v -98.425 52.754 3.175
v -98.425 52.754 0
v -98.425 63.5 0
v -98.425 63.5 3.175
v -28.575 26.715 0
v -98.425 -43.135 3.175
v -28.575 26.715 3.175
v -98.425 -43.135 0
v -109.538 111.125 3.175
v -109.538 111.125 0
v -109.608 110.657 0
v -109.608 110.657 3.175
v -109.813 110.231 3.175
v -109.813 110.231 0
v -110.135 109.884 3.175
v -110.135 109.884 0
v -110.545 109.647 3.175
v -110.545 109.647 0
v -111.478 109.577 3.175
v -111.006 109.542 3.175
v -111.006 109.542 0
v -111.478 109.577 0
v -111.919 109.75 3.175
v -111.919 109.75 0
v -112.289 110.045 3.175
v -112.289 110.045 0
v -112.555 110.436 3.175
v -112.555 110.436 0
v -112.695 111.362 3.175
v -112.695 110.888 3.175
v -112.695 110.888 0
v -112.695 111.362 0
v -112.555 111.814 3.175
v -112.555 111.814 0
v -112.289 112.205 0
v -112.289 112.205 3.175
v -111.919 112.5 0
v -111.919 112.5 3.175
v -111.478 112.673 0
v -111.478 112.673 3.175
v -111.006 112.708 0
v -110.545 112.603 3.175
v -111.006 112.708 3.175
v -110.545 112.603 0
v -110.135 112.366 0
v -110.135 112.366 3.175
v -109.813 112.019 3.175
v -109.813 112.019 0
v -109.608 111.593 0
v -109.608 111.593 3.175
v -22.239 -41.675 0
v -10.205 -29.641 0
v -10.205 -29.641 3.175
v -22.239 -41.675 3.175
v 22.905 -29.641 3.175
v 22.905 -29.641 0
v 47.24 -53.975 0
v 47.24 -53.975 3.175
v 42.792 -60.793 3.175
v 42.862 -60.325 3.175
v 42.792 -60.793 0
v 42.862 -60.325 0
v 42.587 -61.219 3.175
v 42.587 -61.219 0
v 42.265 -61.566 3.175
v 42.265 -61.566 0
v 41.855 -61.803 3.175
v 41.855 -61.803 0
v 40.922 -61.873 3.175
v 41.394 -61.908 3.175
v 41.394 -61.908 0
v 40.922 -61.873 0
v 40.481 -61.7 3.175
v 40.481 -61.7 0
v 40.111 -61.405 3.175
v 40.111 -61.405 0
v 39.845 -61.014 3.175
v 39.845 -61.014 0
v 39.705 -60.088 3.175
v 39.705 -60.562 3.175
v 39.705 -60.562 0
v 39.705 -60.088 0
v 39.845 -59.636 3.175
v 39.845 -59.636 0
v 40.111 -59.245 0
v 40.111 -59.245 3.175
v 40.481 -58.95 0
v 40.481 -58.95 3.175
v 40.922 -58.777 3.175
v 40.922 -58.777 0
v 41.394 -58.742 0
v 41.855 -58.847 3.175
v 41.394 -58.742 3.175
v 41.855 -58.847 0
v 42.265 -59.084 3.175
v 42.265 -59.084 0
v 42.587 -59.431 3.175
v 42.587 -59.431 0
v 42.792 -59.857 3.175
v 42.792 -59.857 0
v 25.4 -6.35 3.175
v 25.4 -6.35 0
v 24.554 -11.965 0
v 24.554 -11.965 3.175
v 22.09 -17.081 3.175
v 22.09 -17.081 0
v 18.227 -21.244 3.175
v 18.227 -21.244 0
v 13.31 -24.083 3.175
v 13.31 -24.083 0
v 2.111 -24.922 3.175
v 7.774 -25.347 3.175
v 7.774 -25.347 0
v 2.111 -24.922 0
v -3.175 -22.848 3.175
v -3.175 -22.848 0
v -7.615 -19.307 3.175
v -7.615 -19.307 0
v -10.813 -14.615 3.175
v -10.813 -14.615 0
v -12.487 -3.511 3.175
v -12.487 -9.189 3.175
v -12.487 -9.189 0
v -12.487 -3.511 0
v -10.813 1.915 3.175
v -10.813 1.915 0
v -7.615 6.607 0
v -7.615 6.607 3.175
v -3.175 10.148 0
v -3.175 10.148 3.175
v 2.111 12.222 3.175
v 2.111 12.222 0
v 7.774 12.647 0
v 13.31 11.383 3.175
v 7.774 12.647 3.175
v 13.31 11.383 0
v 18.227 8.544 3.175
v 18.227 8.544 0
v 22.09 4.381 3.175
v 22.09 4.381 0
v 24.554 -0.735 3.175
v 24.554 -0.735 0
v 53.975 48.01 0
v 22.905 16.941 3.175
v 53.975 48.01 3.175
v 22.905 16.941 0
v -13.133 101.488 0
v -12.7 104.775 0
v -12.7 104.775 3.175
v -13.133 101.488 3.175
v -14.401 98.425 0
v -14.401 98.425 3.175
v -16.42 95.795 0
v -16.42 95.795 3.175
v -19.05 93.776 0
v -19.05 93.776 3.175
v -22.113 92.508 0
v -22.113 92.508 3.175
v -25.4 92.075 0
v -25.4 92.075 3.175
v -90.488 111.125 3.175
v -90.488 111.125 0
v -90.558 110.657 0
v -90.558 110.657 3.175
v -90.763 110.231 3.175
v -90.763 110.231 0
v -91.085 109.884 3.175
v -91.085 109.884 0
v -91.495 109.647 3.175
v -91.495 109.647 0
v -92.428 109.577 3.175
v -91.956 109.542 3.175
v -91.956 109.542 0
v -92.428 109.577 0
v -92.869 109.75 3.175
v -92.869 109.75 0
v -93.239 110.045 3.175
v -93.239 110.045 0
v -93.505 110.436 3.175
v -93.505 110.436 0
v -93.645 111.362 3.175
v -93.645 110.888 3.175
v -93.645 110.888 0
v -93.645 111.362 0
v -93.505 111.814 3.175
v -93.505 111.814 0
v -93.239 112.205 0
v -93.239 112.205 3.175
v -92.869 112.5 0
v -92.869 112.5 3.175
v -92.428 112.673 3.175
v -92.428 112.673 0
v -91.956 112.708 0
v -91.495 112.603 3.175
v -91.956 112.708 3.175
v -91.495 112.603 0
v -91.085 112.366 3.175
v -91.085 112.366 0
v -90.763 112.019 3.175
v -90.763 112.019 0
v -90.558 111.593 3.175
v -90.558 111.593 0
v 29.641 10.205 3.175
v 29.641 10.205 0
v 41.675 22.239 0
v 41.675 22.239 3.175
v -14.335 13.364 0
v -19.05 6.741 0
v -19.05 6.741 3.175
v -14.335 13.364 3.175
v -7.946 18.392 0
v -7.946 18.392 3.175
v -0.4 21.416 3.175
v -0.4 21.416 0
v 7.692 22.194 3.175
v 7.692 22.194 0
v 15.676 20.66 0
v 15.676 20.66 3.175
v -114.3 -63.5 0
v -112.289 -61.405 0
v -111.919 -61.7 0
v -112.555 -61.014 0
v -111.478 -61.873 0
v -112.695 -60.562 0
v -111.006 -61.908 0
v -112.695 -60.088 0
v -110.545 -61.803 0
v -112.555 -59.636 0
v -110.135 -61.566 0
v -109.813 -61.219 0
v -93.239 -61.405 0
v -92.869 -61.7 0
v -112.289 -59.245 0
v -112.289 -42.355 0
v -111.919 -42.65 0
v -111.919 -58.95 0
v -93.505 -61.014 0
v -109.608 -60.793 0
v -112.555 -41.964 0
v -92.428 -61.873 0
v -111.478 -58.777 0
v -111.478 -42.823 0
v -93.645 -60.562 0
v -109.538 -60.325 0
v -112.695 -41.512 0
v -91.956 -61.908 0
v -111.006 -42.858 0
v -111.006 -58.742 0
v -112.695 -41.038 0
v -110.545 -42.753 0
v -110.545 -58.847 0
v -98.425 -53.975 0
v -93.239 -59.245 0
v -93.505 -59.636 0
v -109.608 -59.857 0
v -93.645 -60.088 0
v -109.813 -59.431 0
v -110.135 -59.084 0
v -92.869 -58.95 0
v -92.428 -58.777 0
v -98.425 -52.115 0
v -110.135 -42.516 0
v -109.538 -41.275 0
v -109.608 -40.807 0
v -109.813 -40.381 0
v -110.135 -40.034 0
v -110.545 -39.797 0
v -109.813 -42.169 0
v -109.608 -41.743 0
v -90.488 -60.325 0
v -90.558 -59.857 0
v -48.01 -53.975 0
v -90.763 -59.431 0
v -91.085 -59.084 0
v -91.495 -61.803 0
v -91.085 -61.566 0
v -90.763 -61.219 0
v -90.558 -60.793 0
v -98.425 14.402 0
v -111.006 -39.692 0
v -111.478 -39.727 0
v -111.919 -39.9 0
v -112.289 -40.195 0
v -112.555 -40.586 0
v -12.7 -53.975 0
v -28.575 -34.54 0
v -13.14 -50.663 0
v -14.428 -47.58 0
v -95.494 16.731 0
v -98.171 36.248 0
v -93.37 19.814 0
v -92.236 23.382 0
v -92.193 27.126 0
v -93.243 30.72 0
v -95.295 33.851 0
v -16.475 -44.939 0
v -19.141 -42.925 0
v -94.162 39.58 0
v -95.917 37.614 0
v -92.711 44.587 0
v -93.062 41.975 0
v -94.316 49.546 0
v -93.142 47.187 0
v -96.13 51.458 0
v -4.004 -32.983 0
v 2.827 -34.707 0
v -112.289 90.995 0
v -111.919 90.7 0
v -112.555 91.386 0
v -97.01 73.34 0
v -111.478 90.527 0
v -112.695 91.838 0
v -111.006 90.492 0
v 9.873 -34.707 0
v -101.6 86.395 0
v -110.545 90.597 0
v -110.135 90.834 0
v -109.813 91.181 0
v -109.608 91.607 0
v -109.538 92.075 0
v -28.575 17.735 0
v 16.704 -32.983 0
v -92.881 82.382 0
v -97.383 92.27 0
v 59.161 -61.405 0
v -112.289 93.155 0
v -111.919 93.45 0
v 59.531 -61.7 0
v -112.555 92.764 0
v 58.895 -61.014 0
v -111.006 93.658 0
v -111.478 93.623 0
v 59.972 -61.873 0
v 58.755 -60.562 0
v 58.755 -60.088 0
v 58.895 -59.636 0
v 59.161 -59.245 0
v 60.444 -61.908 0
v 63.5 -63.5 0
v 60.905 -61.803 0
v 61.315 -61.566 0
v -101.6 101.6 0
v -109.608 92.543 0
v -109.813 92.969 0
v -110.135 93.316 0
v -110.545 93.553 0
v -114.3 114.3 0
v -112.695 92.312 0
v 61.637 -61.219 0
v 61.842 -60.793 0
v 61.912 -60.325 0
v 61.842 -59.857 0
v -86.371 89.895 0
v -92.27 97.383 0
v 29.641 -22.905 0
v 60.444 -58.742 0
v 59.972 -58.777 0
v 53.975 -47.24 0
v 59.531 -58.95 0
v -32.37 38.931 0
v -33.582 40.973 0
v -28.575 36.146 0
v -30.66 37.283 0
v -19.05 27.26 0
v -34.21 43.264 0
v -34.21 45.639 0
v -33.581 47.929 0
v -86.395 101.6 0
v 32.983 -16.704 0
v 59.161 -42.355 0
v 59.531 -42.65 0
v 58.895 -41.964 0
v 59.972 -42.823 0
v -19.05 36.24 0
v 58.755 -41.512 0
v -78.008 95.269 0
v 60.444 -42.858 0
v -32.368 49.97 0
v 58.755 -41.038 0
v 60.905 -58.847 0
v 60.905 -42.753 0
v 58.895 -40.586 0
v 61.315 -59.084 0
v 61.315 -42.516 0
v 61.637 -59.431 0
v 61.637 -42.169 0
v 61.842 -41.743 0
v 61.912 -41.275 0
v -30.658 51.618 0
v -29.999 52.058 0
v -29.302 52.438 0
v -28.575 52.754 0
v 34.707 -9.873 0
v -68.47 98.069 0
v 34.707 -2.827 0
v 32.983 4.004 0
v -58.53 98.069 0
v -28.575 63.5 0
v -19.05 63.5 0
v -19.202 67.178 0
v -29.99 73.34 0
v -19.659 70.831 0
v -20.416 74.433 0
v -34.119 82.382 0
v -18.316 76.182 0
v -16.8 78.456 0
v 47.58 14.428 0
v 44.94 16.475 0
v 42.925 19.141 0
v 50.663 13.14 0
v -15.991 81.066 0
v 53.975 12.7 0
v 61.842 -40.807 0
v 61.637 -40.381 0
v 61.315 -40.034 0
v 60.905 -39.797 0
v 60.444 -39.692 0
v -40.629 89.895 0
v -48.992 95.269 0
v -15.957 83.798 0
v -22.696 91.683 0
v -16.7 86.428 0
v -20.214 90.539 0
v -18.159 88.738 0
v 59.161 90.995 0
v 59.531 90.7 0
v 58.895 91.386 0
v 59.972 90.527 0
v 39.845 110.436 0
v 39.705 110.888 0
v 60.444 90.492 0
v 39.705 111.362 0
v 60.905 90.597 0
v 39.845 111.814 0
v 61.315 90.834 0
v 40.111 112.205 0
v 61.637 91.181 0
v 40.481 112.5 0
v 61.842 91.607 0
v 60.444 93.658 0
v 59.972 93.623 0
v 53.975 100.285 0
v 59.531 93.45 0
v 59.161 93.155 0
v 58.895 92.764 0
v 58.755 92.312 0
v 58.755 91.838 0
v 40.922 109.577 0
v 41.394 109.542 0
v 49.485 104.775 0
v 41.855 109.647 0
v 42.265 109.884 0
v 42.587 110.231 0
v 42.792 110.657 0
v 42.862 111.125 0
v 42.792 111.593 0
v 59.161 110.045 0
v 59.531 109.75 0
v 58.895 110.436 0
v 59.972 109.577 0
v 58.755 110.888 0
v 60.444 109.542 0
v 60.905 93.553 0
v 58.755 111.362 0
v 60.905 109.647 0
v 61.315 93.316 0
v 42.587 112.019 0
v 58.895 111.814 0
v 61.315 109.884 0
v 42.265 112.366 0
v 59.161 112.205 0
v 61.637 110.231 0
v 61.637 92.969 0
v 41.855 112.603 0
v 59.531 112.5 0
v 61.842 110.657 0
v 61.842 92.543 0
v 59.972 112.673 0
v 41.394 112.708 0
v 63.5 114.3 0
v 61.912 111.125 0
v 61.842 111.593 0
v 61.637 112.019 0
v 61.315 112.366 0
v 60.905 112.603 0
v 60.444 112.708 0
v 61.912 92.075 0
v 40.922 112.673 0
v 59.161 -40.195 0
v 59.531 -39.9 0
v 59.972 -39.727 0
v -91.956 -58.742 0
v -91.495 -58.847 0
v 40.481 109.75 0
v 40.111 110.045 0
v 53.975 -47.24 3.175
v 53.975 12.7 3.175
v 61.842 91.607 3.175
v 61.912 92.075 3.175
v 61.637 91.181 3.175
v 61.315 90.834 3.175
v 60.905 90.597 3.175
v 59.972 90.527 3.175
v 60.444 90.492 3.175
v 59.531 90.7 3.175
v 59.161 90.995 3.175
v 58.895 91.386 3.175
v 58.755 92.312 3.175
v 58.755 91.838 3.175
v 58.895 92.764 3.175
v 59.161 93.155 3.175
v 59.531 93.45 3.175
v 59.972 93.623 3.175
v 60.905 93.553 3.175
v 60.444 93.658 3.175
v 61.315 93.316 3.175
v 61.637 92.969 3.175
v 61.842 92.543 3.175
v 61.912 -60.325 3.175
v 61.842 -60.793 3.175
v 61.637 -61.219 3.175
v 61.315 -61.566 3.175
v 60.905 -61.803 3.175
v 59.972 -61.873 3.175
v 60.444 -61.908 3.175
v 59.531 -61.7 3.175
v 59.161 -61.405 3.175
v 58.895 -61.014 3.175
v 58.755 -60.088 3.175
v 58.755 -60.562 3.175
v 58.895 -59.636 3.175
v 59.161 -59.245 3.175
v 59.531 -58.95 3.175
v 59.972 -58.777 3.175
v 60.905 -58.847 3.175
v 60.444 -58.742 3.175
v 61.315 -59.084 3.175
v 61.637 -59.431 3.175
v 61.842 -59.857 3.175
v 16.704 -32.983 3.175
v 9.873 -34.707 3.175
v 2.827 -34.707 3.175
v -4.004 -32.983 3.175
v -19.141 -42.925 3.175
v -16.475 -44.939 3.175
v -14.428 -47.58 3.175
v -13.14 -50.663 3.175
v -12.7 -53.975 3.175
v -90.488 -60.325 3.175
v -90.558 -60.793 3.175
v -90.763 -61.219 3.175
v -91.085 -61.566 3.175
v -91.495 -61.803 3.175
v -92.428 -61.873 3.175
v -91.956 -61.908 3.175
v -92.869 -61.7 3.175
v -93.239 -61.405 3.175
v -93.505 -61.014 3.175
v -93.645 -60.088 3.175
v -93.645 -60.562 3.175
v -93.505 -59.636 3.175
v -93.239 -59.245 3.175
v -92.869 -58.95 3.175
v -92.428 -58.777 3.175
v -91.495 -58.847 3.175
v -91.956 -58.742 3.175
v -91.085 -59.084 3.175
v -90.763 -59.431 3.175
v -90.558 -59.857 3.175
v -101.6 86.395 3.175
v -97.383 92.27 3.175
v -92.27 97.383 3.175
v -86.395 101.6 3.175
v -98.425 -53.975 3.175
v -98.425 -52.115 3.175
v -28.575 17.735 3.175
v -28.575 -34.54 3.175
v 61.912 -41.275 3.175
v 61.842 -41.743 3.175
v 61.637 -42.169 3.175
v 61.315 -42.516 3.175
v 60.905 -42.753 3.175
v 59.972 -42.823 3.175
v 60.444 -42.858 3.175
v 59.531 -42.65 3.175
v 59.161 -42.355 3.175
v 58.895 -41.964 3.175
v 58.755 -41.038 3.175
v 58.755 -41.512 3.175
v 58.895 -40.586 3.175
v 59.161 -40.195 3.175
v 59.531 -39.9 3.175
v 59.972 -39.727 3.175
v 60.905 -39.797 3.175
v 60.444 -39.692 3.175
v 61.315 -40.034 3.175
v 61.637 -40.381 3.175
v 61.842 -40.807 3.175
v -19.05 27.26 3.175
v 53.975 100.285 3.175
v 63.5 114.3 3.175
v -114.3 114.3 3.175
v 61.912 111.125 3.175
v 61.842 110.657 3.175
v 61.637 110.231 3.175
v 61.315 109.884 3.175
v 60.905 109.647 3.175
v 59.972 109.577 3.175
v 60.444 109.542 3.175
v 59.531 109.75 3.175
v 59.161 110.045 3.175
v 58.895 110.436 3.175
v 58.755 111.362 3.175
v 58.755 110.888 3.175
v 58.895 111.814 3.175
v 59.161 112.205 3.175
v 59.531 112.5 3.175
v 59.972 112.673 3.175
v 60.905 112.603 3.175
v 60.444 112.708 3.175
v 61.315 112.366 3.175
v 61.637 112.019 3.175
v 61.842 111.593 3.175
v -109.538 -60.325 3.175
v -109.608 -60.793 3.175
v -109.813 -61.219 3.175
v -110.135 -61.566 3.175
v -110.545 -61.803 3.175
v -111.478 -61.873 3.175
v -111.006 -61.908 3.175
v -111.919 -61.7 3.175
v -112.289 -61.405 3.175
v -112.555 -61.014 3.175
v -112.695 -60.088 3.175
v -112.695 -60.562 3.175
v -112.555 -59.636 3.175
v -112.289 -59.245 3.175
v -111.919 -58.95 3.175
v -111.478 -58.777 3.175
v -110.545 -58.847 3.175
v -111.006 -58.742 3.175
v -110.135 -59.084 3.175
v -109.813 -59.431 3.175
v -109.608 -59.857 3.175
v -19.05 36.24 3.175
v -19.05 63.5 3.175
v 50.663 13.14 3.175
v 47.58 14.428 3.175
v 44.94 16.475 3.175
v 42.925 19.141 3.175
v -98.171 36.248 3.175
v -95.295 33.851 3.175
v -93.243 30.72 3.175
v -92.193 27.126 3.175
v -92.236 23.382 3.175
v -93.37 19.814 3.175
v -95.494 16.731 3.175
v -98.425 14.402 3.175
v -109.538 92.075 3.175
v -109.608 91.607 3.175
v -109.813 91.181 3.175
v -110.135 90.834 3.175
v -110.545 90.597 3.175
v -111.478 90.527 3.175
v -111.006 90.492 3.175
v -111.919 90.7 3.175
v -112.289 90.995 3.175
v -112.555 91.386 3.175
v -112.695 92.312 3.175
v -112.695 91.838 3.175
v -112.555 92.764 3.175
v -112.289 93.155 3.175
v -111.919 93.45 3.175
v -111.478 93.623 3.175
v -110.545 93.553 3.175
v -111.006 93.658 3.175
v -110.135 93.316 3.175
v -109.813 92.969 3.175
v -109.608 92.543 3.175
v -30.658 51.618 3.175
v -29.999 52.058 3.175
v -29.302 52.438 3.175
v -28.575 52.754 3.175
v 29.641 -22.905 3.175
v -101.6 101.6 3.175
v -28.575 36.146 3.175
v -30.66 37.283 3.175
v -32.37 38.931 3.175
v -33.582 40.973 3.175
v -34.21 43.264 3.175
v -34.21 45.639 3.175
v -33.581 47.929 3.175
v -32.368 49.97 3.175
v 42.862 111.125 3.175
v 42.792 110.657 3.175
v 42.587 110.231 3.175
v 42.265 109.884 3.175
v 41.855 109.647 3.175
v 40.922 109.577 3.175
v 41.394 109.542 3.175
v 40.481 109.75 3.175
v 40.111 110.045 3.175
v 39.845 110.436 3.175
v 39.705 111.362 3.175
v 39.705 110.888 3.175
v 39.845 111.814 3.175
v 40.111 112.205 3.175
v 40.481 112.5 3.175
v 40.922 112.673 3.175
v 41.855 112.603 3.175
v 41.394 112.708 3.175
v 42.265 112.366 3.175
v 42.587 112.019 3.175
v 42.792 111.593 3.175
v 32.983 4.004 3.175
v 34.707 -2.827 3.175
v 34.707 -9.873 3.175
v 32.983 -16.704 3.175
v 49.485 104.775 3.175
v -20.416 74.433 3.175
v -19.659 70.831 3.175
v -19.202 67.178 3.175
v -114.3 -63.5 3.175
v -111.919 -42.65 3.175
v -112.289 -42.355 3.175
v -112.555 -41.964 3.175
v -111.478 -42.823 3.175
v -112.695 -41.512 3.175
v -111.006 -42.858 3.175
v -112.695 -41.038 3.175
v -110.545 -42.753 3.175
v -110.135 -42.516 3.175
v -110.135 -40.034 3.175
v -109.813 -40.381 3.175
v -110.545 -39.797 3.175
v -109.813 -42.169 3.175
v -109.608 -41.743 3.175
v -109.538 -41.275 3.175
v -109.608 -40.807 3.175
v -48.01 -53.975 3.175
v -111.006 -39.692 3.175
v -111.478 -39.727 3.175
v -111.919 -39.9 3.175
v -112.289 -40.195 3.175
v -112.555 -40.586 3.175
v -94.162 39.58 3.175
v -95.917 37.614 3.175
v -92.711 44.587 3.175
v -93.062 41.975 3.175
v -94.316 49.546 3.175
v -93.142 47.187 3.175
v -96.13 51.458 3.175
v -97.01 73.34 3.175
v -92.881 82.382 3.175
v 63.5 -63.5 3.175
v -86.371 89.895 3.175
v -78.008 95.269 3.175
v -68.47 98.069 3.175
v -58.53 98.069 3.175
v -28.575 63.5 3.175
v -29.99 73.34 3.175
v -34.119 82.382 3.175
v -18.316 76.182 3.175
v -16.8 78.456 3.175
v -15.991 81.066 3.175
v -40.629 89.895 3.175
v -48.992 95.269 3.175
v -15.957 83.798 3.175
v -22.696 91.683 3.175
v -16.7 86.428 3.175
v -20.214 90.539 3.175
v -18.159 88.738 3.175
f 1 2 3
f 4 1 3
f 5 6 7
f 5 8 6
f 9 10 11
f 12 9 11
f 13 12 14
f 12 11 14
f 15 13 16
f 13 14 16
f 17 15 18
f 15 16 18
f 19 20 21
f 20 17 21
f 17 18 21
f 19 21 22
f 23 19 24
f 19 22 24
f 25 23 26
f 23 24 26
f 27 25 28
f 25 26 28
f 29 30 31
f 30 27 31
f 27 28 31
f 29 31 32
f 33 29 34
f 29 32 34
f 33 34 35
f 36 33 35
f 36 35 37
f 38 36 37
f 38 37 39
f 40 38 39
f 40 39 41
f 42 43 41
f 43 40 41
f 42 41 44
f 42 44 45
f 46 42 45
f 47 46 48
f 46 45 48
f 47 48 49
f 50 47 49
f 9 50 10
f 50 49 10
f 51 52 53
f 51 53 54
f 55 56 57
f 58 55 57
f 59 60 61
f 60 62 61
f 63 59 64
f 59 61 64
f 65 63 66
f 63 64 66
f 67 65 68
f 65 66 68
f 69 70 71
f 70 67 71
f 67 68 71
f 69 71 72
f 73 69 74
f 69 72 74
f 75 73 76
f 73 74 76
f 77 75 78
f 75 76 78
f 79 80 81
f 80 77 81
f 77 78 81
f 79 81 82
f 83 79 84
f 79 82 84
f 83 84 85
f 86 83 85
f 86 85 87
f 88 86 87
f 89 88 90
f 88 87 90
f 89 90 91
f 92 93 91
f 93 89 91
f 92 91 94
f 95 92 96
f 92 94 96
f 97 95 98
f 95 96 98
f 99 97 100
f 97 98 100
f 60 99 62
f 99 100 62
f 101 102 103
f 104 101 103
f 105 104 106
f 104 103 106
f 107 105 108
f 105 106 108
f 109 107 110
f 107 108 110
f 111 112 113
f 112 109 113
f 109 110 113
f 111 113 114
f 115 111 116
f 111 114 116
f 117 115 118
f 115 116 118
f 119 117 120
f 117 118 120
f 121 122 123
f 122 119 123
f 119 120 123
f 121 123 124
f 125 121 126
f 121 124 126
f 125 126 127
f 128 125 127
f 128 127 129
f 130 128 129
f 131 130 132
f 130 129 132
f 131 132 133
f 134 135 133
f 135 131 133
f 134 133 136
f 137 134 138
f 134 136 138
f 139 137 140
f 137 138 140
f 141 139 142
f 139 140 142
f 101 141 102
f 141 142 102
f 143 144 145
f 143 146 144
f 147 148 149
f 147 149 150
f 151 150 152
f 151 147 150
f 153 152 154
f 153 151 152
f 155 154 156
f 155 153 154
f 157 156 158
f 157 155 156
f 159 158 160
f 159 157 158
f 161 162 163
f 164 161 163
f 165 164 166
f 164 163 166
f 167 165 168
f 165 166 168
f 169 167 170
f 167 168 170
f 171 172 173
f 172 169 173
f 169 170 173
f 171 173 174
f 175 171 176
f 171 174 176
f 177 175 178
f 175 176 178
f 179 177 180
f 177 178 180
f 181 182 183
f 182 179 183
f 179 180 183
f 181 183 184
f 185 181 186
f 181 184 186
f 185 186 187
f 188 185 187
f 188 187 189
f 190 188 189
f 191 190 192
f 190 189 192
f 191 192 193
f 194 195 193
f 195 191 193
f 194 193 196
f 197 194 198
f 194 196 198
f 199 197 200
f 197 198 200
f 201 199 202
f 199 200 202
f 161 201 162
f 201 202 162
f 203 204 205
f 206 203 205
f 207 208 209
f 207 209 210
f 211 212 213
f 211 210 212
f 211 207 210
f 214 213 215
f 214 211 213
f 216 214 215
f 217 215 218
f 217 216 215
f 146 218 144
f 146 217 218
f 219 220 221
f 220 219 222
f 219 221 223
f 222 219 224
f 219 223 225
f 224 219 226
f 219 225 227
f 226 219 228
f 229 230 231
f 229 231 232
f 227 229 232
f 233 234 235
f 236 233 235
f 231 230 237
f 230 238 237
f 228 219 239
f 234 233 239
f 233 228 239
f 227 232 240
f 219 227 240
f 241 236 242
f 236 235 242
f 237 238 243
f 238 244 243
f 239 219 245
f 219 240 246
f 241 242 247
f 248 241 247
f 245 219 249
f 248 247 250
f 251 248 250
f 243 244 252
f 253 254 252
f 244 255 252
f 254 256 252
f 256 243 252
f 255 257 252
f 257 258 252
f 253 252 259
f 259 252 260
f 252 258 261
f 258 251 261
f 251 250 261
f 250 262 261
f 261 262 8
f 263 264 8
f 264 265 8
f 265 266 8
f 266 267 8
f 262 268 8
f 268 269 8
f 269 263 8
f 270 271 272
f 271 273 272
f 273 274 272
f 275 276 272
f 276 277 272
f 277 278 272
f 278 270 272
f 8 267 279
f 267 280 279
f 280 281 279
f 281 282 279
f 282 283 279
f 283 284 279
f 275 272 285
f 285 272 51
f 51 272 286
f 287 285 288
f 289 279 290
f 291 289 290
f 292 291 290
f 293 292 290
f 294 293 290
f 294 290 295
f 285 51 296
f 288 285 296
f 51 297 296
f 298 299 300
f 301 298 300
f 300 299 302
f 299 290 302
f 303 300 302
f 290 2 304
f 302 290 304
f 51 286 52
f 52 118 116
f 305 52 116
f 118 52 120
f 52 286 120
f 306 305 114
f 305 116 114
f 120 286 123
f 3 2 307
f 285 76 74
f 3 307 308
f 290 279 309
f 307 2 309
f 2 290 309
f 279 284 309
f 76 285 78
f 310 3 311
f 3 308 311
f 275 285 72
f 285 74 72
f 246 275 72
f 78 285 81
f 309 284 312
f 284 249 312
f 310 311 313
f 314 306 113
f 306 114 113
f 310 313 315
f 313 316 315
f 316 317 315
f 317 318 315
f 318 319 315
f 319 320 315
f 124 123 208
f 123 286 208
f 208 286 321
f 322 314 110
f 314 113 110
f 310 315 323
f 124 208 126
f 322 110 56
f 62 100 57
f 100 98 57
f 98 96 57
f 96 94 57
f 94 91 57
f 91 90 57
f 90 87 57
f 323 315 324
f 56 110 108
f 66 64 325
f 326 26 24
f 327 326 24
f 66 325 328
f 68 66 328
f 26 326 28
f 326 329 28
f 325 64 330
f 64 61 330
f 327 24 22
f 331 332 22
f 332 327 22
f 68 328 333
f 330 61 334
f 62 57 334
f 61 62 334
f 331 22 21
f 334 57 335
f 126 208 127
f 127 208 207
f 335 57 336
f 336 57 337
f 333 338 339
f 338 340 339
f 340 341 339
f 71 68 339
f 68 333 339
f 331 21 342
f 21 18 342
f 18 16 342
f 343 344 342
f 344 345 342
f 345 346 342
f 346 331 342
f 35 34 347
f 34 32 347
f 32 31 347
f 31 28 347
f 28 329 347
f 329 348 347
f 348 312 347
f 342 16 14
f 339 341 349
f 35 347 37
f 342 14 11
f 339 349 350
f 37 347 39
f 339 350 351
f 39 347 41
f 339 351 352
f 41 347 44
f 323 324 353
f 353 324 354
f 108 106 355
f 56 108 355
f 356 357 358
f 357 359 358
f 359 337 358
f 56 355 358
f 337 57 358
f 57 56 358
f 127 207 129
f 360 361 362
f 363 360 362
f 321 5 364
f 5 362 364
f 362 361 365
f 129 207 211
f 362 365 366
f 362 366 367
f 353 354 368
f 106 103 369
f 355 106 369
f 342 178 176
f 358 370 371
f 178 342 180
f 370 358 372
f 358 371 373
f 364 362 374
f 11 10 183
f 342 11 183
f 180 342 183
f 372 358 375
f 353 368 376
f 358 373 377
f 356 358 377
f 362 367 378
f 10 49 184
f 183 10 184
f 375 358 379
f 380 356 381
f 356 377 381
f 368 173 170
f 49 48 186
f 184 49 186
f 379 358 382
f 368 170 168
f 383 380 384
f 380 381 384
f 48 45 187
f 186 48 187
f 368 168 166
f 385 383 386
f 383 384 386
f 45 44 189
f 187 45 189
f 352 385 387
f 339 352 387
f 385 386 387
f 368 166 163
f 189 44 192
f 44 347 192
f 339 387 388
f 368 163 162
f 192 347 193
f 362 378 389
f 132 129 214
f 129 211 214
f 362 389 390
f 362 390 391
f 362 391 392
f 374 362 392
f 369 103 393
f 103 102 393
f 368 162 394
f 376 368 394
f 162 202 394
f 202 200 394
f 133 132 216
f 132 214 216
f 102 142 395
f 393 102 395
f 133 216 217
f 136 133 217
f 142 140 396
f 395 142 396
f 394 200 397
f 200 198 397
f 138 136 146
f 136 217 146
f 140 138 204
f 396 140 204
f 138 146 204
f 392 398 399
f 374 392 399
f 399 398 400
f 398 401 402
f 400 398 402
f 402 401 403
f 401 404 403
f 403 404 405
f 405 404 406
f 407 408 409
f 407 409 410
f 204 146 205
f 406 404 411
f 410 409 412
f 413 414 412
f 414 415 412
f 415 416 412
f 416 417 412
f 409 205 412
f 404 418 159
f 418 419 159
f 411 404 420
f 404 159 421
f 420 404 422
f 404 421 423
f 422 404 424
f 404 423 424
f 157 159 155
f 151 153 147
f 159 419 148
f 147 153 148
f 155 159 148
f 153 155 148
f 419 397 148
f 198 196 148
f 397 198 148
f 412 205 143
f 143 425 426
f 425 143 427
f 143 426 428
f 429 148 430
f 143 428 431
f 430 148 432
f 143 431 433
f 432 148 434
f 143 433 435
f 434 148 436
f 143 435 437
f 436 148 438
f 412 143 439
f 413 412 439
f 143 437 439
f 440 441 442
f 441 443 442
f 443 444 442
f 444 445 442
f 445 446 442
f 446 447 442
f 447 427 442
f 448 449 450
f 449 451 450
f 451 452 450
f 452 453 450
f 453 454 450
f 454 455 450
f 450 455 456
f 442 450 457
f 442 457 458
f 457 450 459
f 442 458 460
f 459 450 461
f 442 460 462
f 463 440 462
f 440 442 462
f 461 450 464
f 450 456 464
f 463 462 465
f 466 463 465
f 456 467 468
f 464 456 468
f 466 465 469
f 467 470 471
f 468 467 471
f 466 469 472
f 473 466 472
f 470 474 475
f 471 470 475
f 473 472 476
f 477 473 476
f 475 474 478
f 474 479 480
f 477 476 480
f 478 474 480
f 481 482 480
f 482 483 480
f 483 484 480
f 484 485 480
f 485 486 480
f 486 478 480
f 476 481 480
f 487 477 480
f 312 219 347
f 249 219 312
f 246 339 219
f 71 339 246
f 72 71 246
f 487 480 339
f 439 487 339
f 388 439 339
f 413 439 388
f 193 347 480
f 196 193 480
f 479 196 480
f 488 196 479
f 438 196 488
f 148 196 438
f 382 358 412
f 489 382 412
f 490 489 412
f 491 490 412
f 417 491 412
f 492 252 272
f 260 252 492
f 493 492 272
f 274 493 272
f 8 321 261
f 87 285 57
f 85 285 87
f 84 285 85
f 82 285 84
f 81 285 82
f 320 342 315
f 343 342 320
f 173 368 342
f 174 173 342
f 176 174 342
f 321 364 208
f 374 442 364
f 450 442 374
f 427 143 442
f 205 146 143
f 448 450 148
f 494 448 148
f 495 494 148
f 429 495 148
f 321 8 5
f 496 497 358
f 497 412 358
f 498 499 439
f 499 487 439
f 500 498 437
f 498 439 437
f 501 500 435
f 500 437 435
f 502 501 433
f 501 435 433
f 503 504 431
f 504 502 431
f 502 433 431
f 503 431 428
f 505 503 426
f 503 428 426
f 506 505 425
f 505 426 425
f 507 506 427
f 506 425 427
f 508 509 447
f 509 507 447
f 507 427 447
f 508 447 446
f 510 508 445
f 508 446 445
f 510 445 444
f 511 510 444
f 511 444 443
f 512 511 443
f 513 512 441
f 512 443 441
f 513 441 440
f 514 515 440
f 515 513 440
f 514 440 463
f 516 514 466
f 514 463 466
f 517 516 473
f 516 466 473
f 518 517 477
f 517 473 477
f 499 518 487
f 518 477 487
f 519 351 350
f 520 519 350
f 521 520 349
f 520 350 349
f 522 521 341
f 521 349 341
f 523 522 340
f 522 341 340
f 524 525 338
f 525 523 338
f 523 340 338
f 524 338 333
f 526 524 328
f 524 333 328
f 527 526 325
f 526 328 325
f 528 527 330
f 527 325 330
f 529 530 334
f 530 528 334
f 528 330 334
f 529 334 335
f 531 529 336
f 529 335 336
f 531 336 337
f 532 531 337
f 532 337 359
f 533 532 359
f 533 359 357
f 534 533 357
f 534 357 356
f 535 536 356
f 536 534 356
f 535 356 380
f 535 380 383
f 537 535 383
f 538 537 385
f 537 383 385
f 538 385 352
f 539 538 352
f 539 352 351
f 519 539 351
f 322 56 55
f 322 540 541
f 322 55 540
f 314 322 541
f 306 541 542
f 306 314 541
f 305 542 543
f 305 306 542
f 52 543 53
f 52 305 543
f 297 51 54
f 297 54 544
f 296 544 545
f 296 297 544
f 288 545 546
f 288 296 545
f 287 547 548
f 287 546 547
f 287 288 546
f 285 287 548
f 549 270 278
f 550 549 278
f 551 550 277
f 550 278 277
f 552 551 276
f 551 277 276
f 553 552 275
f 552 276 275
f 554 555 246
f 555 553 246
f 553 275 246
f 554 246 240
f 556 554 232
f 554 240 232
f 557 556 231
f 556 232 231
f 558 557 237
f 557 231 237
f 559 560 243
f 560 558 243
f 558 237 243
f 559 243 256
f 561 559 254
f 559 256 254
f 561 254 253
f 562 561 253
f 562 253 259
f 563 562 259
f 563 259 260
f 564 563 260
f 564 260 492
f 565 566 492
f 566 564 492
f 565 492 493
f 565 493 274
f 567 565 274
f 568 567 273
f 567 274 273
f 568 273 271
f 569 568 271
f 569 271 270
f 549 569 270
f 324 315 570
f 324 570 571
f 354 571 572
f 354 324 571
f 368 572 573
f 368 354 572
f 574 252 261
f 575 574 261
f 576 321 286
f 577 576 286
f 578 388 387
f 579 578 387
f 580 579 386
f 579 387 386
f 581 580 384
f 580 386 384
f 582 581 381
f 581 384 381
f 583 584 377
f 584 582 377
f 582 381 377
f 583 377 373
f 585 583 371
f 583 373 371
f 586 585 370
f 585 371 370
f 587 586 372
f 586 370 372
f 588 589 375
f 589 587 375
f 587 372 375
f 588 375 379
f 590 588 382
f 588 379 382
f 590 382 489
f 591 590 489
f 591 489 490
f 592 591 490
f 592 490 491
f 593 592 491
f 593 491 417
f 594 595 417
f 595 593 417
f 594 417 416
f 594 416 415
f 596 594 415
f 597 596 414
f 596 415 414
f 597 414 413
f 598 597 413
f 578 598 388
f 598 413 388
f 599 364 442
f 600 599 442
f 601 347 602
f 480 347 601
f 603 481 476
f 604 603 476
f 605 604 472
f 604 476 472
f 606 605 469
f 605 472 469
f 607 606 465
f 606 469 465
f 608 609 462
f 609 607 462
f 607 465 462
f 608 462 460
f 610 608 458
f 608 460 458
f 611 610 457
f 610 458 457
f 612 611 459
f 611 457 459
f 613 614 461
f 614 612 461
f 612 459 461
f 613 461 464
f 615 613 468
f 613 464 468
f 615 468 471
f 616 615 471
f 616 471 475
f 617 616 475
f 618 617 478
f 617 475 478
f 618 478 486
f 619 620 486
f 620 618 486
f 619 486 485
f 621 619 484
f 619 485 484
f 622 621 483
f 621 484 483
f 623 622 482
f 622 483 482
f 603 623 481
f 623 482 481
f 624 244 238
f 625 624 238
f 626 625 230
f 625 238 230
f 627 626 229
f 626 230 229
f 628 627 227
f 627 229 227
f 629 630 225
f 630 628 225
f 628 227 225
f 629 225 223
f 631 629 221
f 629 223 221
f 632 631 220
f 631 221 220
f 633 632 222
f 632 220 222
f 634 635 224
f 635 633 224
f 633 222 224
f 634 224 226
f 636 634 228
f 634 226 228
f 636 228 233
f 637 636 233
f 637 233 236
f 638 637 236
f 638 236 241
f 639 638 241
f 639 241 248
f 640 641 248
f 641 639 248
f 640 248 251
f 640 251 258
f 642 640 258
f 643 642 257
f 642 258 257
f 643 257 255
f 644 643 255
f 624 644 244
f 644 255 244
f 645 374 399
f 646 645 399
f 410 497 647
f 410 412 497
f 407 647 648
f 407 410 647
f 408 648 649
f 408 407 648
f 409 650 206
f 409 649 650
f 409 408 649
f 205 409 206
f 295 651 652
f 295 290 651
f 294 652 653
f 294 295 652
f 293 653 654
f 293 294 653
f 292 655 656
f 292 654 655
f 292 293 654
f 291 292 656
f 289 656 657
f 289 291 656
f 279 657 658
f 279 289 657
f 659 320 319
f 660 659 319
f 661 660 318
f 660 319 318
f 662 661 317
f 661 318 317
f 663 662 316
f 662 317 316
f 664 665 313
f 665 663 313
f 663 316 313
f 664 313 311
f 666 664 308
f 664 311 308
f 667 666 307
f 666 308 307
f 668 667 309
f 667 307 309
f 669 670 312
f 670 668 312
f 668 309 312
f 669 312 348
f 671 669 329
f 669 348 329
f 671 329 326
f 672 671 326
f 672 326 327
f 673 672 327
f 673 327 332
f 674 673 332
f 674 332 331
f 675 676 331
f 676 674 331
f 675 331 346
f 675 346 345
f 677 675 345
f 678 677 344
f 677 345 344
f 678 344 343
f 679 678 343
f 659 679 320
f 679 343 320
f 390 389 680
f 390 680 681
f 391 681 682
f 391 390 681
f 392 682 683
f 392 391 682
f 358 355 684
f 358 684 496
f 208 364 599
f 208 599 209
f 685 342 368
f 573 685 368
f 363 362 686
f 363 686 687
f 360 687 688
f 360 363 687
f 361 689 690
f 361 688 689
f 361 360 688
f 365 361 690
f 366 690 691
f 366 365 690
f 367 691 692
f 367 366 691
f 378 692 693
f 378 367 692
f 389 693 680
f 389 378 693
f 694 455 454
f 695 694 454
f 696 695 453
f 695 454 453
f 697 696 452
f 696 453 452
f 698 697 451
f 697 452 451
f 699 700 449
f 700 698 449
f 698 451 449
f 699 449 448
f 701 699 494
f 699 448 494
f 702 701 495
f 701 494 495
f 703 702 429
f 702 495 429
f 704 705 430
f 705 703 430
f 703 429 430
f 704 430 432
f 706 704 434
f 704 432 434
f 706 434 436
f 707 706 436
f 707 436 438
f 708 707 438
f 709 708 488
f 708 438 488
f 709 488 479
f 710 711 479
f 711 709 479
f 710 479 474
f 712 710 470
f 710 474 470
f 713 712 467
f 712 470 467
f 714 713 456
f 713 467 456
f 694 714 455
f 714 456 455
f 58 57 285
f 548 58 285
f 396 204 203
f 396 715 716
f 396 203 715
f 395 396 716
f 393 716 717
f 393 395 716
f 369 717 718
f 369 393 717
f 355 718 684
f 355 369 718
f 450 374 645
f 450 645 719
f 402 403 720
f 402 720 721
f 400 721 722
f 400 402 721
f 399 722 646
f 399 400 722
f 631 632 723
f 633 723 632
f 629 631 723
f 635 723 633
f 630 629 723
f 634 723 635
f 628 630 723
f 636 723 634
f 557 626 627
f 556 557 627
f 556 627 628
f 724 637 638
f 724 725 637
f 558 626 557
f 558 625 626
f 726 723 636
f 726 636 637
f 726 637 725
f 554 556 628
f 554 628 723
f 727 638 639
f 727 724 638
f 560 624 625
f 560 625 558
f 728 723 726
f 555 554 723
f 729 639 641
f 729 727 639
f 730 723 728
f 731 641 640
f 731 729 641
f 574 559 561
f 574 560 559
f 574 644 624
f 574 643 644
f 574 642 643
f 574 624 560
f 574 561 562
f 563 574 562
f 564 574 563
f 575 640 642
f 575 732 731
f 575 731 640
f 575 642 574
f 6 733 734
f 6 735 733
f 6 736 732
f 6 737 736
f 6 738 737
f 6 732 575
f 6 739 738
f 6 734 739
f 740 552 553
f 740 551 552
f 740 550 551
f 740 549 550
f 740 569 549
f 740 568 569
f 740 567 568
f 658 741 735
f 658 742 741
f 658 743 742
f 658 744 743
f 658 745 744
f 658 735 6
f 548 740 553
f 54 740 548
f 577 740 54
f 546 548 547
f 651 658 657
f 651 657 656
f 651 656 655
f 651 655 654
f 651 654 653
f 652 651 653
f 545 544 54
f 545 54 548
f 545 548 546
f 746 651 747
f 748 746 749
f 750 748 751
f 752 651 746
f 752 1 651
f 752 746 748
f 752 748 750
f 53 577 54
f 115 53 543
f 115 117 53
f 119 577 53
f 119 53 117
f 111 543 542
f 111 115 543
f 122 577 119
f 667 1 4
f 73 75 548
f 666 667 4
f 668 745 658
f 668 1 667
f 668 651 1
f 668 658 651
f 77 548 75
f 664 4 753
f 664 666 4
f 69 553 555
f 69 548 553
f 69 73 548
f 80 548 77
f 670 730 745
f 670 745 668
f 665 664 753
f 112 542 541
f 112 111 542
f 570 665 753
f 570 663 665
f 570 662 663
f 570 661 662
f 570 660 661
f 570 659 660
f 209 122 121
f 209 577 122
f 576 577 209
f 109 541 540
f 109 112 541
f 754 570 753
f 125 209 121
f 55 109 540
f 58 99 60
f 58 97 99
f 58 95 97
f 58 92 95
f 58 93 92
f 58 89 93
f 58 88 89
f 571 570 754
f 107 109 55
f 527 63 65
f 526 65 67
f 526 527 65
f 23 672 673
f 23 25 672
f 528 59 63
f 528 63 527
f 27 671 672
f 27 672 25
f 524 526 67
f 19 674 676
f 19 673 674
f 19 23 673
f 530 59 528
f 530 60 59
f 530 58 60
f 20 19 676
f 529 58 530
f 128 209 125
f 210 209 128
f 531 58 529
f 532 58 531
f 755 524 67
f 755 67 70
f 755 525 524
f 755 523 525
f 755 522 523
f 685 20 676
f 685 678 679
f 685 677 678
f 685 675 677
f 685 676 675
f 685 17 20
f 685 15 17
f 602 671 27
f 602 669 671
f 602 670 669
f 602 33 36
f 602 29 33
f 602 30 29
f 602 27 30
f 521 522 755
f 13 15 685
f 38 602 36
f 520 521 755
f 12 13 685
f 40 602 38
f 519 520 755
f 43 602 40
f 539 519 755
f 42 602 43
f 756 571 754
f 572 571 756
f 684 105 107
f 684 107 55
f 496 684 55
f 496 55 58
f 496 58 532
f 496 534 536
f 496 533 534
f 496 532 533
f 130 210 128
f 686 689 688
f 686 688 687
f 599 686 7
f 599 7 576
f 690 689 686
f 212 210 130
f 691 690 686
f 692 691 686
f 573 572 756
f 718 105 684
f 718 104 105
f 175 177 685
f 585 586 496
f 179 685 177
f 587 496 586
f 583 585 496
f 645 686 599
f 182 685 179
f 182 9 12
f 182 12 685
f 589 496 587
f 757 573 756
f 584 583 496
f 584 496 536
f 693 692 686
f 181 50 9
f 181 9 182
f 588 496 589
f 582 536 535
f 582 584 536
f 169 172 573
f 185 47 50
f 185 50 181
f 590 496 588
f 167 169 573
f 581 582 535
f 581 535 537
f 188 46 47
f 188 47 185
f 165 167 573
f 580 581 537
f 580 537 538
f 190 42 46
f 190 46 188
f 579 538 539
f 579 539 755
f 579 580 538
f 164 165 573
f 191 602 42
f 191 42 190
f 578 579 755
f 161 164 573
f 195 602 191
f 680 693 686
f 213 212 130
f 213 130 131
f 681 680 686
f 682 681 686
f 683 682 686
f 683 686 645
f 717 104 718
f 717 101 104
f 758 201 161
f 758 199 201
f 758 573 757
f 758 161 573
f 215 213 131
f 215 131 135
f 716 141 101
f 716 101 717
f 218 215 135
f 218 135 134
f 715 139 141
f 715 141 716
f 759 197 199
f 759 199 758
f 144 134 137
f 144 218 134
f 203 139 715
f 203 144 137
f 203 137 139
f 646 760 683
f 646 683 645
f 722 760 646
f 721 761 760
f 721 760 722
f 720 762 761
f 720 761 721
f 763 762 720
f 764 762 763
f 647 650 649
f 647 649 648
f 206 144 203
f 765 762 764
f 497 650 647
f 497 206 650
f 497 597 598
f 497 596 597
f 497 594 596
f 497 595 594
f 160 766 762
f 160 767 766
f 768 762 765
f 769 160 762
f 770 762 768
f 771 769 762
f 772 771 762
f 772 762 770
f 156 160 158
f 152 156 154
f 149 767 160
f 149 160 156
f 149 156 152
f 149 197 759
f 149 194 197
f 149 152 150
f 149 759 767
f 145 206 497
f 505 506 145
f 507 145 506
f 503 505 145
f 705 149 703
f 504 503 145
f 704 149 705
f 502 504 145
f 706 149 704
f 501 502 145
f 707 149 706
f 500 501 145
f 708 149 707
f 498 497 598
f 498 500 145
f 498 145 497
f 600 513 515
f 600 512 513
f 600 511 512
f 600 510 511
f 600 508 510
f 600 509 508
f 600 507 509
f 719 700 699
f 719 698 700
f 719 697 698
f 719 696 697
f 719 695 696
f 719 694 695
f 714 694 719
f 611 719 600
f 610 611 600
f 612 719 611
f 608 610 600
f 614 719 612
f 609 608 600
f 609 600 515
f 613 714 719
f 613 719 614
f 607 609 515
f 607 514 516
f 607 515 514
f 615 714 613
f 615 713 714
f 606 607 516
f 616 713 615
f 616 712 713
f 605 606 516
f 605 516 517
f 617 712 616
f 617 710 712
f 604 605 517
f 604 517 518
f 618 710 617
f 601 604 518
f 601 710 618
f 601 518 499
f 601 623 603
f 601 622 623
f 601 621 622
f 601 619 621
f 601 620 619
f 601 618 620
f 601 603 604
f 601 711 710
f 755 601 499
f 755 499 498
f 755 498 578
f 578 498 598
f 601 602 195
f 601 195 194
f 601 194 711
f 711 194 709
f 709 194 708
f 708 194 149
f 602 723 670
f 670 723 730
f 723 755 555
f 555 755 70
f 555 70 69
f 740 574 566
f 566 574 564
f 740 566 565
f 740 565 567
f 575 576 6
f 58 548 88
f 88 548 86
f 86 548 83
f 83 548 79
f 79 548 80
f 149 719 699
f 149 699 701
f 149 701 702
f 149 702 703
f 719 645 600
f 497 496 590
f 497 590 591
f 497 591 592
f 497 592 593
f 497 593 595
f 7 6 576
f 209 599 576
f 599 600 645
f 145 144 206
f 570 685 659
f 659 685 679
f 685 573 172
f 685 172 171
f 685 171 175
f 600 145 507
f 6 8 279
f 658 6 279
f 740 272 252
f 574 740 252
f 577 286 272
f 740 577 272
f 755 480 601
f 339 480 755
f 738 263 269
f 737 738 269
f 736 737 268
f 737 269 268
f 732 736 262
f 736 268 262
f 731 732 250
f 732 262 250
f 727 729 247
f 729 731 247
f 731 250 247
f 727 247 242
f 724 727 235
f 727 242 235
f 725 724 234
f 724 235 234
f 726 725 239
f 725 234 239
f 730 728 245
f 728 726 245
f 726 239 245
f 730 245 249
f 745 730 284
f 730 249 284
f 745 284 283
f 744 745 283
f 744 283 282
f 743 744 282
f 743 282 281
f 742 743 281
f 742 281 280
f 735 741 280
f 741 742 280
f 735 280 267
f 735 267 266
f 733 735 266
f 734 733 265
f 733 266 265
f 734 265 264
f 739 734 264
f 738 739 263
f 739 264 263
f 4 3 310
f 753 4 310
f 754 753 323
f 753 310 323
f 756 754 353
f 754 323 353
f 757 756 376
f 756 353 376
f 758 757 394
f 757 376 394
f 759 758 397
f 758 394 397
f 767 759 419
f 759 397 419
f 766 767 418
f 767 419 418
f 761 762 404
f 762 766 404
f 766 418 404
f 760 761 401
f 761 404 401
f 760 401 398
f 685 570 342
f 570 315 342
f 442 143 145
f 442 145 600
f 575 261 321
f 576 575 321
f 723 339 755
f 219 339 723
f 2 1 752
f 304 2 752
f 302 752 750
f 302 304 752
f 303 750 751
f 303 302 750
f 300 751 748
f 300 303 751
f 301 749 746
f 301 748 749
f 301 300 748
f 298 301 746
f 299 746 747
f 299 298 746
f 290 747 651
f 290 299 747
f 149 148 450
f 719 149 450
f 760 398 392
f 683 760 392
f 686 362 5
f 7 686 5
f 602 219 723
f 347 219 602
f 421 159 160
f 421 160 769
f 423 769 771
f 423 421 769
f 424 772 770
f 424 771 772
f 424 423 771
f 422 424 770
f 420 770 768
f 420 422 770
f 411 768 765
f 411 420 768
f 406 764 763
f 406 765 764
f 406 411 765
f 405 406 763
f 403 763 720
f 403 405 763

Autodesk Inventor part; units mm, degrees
ref_plane "YZ Plane" through (0, 0, 0) normal (1, 0, 0) x (0, 1, 0)
ref_plane "XZ Plane" through (0, 0, 0) normal (0, 1, 0) x (-1, 0, 0)
ref_plane "XY Plane" through (0, 0, 0) normal (0, 0, 1) x (1, 0, 0)
sketch "Sketch1" plane through (0, 0, 0) normal (0, 0, 1) x (1, 0, 0)
  line L0 (-114.3, 114.3) -> (63.5, 114.3)
  line L1 (63.5, 114.3) -> (63.5, -63.5)
  line L2 (63.5, -63.5) -> (-114.3, -63.5)
  line L3 (-114.3, -63.5) -> (-114.3, 114.3)
  circle A0 centre (6.35, -6.35) radius 19.05
  circle A1 centre (41.275, 111.125) radius 1.5875
  circle A2 centre (60.325, -41.275) radius 1.5875
  circle A3 centre (-92.075, -60.325) radius 1.5875
  circle A4 centre (-111.125, 92.075) radius 1.5875
  circle A5 centre (-111.125, 111.125) radius 1.5875
  circle A6 centre (-92.075, 111.125) radius 1.5875
  circle A7 centre (60.325, 92.075) radius 1.5875
  circle A8 centre (60.325, -60.325) radius 1.5875
  circle A9 centre (41.275, -60.325) radius 1.5875
  circle A10 centre (-111.125, -60.325) radius 1.5875
  circle A11 centre (-111.125, -41.275) radius 1.5875
  circle A12 centre (60.325, 111.125) radius 1.5875
  arc A13 (-92.7105, 44.3557) -> (-34.2895, 44.3557) centre (-63.5, 63.5) ccw construction
  line L4 (-98.425, 63.5) -> (-28.575, 63.5)
  line L5 (-28.575, 63.5) -> (-28.575, 52.7537)
  line L6 (-98.425, -53.975) -> (-98.425, -52.1151)
  line L7 (53.975, -53.975) -> (6.35, -6.35) construction
  line L8 (22.9054, -29.6406) -> (47.2398, -53.975)
  line L9 (47.2398, -53.975) -> (-12.7, -53.975)
  line L10 (6.35, -6.35) -> (40.026, 27.326) construction
  line L11 (29.6406, 10.2054) -> (41.6746, 22.2394)
  arc A14 (29.6406, -22.9054) -> (29.6406, 10.2054) centre (6.35, -6.35) ccw
  line L12 (29.6406, -22.9054) -> (53.975, -47.2398)
  line L13 (-19.05, 27.2599) -> (-19.05, 6.7409)
  arc A15 (22.9054, 16.9406) -> (-19.05, 6.7409) centre (6.35, -6.35) ccw
  line L14 (-101.6, 101.6) -> (-86.3953, 101.6)
  line L15 (-101.6, 86.3953) -> (-101.6, 101.6)
  arc A16 (-86.3953, 101.6) -> (-101.6, 86.3953) centre (-63.5, 63.5) ccw
  arc A17 (-19.05, 63.5) -> (-20.4156, 74.4333) centre (-63.5, 63.5) ccw
  line L16 (-19.05, 36.2401) -> (-19.05, 63.5)
  arc A18 (-20.4156, 74.4333) -> (-25.4, 92.075) centre (-25.4, 82.55) ccw
  arc A19 (-28.575, 52.7537) -> (-28.575, 36.1463) centre (-25.4, 44.45) ccw
  line L17 (-28.575, 36.1463) -> (-28.575, 26.7151)
  line L18 (-98.425, 52.7537) -> (-98.425, 63.5)
  arc A20 (-30.6583, 51.6182) -> (-98.425, 63.5) centre (-63.5, 63.5) ccw
  line L19 (6.35, -6.35) -> (-25.0809, -37.7809) construction
  line L20 (-10.2054, -29.6406) -> (-22.2394, -41.6746)
  arc A21 (-10.2054, -29.6406) -> (22.9054, -29.6406) centre (6.35, -6.35) ccw
  line L21 (-28.575, -34.5398) -> (-48.0102, -53.975)
  line L22 (-48.0102, -53.975) -> (-98.425, -53.975)
  line L23 (-25.0809, -37.7809) -> (-43.0414, -55.7414) construction
  line L24 (40.026, 27.326) -> (57.9865, 45.2865)
  line L25 (57.9865, 45.2865) -> (53.975, 41.275)
  arc A22 (-12.7, -53.975) -> (-22.2394, -41.6746) centre (-25.4, -53.975) ccw
  arc A23 (41.6746, 22.2394) -> (53.975, 12.7) centre (53.975, 25.4) ccw
  line L26 (53.975, 12.7) -> (53.975, -47.2398)
  arc A24 (-98.425, 14.4015) -> (-98.171, 36.2479) centre (-104.775, 25.4) ccw
  arc A25 (-98.171, 36.2479) -> (-98.425, 52.7537) centre (-101.6, 44.45) ccw
  line L27 (53.975, 48.0102) -> (53.975, 100.2849)
  line L28 (-12.7, 104.775) -> (49.4849, 104.775)
  arc A26 (-98.425, 63.5) -> (-96.3417, 51.6182) centre (-63.5, 63.5) ccw construction
  arc A27 (-25.4, 92.075) -> (-12.7, 104.775) centre (-25.4, 104.775) ccw
  line L29 (-114.3, -63.5) -> (63.5, 114.3) construction
  line L30 (-98.425, -43.1349) -> (-28.575, 26.7151)
  line L31 (-98.425, -52.1151) -> (-28.575, 17.7349)
  line L32 (22.9054, 16.9406) -> (53.975, 48.0102)
  line L33 (-19.05, 36.2401) -> (49.4849, 104.775)
  line L34 (-19.05, 27.2599) -> (53.975, 100.2849)
  line L35 (-28.575, 17.7349) -> (-28.575, -34.5398)
  line L36 (-28.575, 26.7151) -> (-28.575, 17.7349) construction
  line L37 (49.4849, 104.775) -> (53.975, 104.775) construction
  line L38 (53.975, 100.2849) -> (53.975, 104.775) construction
  line L39 (-98.425, -52.1151) -> (-98.425, -43.1349) construction
  line L40 (-98.425, -43.1349) -> (-98.425, 14.4015)
  line L41 (-25.4, -53.975) -> (-104.775, 25.4) construction
  point P0 (0, 0)
  point P1 (-101.6, 82.55)
  dimension "d0" = 114.3
  dimension "d1" = 177.8
  dimension "d2" = 177.8
  dimension "d3" = 114.3
  dimension "d4" = 38.1
  dimension "d5" = 57.15
  dimension "d6" = 57.15
  dimension "d10" = 3.175
  dimension "d11" = 3.175
  dimension "d12" = 3.175
  dimension "d15" = 3.175
  dimension "d16" = 22.225
  dimension "d17" = 22.225
  dimension "d18" = 3.175
  dimension "d19" = 3.175
  dimension "d20" = 22.225
  dimension "d23" = 3.175
  dimension "d24" = 3.175
  dimension "d25" = 22.225
  dimension "d26" = 3.175
  dimension "d27" = 3.175
  dimension "d28" = 3.175
  dimension "d29" = 3.175
  dimension "d30" = 22.225
  dimension "d34" = 3.175
  dimension "d35" = 3.175
  dimension "d36" = 3.175
  dimension "d37" = 3.175
  dimension "d38" = 22.225
  dimension "d39" = 3.175
  dimension "d40" = 3.175
  dimension "d41" = 3.175
  dimension "d42" = 3.175
  dimension "d43" = 3.175
  dimension "d44" = 3.175
  dimension "d45" = 3.175
  dimension "d46" = 22.225
  dimension "d47" = 3.175
  dimension "d48" = 3.175
  dimension "d49" = 3.175
  dimension "d50" = 3.175
  dimension "d51" = 22.225
  dimension "d52" = 3.175
  dimension "d55" = 69.85
  dimension "d56" = 50.8
  dimension "d57" = 50.8
  dimension "d93" = 69.85
  dimension "d94" = 15.875
  dimension "d97" = 38.1
  dimension "d98" = 38.1
  dimension "d99" = 38.1
  dimension "d100" = 38.1
  dimension "d101" = 19.05
  dimension "d102" = 19.05
  dimension "d103" = 19.05
  dimension "d104" = 19.05
  dimension "d212" = 9.525
  dimension "d216" = 4.7625
  dimension "d218" = 45
  dimension "d222" = 6.7352
  dimension "d226" = 28.575
  dimension "d227" = 4.7625
  dimension "d228" = 4.7625
  dimension "d232" = 9.525
extrude "Extrusion12" [suppressed]
extrude "Extrusion13" [suppressed]
hole "Hole9" [suppressed]
extrude "Extrusion14" [suppressed]
fillet "Fillet2" [suppressed]
fillet "Fillet3" [suppressed]
extrude "Extrusion15" [suppressed]
fillet "Fillet4" [suppressed]
hole "Hole10" [suppressed]
hole "Hole11" [suppressed]
hole "Hole12" [suppressed]
chamfer "Chamfer1" [suppressed]
chamfer "Chamfer2" [suppressed]
extrude "Extrusion16" [suppressed]
fillet "Fillet6" [suppressed]
extrude "Extrusion17" add sketch "Sketch1" along normal blind 3.175
properties part number "upper gearbox bottom plate"
